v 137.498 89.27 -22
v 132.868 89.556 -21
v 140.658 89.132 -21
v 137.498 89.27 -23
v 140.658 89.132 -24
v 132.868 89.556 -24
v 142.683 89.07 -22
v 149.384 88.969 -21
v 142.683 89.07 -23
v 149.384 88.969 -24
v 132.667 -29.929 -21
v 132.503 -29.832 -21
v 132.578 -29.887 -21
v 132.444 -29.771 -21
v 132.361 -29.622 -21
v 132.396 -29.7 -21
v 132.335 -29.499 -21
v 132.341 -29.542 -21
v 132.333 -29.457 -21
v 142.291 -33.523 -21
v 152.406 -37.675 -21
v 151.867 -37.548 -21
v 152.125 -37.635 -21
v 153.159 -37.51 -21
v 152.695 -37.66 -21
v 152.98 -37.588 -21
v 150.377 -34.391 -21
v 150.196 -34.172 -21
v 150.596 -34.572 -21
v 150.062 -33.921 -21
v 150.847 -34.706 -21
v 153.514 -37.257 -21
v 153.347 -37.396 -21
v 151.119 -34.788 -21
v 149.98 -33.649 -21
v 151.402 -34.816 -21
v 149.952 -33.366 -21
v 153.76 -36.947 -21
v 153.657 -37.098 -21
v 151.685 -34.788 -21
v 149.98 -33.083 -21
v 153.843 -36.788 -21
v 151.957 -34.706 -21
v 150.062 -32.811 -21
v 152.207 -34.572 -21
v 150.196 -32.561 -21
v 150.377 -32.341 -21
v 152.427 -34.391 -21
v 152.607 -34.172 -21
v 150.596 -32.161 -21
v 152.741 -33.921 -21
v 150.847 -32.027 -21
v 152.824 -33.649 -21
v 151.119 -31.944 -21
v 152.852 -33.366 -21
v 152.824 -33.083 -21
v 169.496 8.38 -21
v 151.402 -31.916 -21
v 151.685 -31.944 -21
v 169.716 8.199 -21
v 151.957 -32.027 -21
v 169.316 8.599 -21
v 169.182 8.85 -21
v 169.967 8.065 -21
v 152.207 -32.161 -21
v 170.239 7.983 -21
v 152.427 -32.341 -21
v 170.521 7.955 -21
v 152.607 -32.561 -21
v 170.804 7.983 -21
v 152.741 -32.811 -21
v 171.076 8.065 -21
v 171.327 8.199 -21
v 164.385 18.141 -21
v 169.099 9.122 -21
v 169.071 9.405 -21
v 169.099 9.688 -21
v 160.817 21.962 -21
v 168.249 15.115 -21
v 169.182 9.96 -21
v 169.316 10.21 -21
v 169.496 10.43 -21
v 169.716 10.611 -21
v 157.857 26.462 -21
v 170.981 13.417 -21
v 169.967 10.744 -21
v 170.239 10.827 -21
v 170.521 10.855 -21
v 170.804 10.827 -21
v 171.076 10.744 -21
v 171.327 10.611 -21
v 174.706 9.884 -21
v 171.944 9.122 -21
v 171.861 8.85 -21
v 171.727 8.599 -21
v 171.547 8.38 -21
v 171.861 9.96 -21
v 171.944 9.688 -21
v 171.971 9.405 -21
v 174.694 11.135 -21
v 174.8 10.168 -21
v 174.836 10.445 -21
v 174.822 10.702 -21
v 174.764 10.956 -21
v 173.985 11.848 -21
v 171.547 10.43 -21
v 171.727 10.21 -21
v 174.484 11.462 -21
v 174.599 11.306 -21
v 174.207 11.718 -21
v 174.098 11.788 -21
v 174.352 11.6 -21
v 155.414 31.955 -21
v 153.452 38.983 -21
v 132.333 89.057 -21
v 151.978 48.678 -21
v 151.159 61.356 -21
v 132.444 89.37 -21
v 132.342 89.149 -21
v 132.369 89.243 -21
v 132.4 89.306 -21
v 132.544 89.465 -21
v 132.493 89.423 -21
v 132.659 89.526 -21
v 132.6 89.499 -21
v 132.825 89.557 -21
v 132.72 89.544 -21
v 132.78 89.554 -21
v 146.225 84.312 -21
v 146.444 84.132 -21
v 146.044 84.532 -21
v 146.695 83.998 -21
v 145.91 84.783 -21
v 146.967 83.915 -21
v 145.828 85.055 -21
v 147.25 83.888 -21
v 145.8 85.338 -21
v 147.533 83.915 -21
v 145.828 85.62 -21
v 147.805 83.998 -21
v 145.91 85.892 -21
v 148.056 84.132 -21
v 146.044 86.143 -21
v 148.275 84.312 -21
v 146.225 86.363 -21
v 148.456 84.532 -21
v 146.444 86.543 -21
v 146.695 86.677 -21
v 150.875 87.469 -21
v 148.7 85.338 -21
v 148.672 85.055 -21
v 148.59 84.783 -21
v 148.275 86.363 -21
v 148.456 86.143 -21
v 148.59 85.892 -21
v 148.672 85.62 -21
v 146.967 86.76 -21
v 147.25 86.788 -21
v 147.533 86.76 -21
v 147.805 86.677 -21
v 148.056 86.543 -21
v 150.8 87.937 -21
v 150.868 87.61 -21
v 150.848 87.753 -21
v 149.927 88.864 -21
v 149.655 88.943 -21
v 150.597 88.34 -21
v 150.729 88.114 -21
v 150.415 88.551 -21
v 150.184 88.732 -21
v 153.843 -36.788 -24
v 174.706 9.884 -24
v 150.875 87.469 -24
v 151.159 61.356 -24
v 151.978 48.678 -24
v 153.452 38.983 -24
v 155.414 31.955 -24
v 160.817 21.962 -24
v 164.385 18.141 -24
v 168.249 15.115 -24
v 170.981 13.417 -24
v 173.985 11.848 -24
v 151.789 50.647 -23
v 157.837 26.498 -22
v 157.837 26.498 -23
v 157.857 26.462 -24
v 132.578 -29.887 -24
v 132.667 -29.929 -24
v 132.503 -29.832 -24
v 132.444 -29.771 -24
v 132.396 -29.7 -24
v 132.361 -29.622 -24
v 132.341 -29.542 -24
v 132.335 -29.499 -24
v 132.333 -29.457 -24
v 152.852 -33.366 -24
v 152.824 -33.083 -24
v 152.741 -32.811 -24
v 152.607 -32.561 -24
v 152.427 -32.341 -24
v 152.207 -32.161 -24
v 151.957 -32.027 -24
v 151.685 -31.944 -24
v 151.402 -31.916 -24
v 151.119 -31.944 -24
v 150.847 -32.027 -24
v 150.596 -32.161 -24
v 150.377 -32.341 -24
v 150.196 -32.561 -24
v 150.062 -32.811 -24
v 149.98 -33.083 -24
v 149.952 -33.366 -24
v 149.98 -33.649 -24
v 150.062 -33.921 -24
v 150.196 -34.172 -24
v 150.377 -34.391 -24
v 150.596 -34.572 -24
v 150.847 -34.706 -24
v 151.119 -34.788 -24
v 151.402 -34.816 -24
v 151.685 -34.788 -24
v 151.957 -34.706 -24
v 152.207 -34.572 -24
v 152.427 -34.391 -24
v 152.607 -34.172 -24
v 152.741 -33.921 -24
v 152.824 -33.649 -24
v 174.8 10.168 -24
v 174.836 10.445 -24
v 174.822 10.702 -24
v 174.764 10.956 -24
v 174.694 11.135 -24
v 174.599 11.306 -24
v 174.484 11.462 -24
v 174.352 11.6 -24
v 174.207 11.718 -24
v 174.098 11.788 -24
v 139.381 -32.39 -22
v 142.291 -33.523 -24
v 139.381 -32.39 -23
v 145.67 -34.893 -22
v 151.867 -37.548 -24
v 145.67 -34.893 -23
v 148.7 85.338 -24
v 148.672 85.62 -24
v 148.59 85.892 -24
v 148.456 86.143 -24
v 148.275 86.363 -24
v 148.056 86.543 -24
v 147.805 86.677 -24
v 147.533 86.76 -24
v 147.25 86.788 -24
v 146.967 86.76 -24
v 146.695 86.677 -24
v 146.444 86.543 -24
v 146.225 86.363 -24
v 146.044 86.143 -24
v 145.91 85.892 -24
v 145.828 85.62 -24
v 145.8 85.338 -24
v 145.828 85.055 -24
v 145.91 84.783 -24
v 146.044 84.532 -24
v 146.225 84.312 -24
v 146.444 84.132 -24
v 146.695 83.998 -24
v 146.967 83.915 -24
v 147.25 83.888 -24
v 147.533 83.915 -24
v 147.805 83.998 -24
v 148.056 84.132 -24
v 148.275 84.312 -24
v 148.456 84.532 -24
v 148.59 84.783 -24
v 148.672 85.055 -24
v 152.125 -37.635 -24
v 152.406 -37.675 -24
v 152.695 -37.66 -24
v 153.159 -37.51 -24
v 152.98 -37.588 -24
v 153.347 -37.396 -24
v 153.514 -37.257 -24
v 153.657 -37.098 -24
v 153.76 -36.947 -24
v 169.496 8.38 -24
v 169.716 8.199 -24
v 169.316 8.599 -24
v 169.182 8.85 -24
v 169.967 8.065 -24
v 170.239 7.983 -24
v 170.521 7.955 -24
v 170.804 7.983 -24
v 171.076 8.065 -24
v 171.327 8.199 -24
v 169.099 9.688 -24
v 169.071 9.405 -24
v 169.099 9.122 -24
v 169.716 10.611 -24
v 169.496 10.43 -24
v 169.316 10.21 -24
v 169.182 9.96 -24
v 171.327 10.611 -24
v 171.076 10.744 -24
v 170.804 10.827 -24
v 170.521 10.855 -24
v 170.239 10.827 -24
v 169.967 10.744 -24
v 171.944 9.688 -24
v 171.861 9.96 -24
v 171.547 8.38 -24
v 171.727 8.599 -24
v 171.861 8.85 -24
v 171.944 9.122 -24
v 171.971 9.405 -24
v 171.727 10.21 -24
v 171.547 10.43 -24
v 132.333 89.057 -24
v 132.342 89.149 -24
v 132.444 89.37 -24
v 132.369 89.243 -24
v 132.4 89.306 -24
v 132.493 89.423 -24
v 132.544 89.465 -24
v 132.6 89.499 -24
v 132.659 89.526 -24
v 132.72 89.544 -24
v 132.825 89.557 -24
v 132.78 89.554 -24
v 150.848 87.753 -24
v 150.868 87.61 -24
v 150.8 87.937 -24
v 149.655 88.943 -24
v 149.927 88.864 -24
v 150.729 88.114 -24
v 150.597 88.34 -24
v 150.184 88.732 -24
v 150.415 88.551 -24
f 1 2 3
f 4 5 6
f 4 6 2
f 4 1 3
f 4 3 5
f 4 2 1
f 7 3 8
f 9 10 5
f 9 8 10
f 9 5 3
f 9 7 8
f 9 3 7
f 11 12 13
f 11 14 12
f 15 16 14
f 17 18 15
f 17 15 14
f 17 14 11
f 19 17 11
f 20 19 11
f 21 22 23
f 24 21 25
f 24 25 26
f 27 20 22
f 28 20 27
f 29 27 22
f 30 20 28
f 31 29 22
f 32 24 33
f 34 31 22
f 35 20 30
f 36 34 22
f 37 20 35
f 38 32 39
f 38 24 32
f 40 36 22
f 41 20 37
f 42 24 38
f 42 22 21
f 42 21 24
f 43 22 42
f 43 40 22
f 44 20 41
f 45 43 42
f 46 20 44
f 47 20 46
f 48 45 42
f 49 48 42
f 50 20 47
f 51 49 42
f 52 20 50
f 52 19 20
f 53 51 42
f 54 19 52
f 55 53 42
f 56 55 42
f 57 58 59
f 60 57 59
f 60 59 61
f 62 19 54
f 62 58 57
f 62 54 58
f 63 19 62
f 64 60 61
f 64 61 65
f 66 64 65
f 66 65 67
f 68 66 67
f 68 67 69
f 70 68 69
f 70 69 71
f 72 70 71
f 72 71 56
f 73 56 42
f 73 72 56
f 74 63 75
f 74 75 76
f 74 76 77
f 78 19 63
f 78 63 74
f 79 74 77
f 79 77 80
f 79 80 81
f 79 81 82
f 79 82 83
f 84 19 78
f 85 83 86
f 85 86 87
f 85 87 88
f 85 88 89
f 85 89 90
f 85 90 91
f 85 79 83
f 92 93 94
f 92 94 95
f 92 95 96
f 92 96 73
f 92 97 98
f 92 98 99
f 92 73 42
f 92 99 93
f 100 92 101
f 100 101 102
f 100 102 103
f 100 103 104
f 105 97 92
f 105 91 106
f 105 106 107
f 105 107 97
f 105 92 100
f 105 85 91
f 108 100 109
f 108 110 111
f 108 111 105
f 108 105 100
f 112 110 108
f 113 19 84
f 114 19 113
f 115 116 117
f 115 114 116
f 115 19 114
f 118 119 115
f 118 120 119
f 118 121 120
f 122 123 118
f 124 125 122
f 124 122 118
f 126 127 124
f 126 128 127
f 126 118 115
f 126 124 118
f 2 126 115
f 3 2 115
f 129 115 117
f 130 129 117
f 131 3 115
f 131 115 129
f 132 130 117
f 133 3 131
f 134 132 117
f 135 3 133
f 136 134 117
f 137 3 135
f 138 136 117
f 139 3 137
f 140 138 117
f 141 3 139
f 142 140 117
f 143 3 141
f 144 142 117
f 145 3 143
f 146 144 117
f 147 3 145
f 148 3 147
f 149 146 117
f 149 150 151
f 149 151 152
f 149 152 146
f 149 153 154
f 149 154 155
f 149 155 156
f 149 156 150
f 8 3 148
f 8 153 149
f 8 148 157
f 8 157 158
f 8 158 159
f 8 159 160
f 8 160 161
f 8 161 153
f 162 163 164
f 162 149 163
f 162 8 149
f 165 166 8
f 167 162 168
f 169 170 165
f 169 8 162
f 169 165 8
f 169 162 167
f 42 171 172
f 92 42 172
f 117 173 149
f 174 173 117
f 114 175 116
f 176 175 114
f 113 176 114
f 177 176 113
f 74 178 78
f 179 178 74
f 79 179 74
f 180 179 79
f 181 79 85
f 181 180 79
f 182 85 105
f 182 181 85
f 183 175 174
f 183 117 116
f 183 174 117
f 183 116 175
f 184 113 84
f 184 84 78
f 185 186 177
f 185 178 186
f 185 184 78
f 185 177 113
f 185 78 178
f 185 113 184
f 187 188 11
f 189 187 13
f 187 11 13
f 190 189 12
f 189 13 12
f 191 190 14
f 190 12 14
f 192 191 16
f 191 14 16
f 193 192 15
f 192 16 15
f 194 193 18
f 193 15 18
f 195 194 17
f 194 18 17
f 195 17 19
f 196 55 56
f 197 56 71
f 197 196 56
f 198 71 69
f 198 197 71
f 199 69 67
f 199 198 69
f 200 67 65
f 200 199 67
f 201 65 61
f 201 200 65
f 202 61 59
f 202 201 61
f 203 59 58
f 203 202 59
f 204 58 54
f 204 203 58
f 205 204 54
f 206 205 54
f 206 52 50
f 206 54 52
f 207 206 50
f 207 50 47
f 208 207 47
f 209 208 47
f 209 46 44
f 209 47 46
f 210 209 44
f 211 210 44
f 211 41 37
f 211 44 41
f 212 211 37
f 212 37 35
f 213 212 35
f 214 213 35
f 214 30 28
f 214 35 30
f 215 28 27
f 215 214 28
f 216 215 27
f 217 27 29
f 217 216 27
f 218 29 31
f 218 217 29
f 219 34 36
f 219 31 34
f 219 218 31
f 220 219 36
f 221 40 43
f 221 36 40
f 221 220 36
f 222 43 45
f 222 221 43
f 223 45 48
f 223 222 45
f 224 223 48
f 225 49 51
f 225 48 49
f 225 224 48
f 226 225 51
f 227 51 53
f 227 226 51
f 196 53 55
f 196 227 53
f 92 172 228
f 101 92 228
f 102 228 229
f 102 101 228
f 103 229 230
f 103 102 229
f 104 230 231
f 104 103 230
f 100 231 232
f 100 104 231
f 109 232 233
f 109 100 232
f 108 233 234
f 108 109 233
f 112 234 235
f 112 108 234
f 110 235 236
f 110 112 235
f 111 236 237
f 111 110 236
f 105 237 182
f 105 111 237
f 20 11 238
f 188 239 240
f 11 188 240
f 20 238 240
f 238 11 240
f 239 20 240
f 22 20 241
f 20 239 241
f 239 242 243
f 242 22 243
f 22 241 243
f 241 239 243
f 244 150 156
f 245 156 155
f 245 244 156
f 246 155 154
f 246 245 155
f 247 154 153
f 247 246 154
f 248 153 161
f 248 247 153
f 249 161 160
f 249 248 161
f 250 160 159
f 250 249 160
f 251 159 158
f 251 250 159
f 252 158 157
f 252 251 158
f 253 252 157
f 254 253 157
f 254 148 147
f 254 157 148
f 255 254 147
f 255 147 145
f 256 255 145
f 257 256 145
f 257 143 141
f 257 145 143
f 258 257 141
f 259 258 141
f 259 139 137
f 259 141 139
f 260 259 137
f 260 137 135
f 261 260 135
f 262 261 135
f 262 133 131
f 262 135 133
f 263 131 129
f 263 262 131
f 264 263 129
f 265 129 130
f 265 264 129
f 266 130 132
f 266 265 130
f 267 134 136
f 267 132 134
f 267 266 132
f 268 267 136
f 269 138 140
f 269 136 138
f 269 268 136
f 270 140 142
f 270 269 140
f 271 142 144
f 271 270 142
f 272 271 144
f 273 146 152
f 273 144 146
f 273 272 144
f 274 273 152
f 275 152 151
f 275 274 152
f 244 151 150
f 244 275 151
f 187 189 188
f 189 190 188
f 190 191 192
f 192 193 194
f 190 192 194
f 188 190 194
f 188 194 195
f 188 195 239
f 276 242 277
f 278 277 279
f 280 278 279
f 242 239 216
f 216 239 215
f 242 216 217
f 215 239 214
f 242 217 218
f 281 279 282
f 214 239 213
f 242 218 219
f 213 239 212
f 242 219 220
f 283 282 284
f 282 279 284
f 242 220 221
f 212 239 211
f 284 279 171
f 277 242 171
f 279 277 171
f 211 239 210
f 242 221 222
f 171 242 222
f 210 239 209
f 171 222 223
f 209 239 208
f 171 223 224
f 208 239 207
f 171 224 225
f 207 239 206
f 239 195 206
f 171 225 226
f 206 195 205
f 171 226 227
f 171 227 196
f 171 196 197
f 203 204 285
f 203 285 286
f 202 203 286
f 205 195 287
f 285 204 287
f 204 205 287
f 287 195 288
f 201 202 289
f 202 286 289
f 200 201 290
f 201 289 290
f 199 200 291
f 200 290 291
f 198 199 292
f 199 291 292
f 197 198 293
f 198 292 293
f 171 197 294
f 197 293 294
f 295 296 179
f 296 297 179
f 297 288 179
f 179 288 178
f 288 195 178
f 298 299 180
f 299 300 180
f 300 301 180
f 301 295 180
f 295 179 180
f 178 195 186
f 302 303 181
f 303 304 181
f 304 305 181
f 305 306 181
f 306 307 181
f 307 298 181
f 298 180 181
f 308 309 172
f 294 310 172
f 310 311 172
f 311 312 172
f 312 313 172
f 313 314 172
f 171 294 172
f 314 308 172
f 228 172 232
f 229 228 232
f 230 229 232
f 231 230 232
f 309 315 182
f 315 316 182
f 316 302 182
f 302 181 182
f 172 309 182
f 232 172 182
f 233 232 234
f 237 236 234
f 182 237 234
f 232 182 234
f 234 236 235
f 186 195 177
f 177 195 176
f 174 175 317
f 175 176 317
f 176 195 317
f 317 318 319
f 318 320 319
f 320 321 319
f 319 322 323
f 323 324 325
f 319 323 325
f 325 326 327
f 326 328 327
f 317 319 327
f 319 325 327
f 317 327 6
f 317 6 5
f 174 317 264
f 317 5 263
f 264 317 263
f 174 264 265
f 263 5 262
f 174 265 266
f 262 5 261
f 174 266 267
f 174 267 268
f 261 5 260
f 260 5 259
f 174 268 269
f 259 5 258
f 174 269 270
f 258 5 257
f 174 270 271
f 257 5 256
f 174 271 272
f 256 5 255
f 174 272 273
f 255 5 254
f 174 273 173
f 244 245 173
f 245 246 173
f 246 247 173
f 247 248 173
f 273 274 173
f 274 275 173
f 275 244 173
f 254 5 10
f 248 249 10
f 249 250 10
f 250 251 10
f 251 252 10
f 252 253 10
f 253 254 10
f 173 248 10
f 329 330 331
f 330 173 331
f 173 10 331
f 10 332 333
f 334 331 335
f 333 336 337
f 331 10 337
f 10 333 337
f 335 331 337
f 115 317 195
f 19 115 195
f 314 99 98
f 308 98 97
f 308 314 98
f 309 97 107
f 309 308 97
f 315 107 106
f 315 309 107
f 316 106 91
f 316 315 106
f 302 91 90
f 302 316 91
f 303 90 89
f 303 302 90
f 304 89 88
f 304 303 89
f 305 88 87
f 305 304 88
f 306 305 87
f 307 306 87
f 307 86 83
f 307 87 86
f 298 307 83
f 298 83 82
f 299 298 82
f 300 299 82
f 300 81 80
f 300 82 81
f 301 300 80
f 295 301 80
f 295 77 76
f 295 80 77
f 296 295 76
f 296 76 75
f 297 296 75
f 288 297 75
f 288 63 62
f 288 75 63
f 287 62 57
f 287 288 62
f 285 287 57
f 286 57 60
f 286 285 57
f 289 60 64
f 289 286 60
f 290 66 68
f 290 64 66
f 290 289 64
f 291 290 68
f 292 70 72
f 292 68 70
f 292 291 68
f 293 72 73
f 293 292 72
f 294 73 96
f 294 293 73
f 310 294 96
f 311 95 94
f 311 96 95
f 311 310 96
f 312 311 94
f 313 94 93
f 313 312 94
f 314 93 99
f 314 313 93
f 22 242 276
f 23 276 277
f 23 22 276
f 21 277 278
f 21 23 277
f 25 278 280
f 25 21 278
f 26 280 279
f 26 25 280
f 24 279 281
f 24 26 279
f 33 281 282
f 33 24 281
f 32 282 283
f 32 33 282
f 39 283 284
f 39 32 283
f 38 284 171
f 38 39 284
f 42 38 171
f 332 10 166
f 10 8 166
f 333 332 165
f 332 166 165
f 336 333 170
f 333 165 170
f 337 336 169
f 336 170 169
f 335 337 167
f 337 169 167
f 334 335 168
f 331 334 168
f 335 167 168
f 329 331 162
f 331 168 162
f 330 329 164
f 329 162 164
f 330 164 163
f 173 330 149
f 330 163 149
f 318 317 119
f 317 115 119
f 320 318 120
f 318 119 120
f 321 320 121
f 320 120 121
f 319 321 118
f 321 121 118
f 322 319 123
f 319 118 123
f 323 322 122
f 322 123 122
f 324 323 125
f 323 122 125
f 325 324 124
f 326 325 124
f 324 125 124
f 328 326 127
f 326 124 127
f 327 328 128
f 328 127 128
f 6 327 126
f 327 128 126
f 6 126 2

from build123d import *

# Parameters (mm, degrees)
PAD012_DEPTH    = 3
SKETCH047_R     = 1.45
POCKET013_DEPTH = 27
FILLET010_R     = 1.5
FILLET018_R     = 0.5


with BuildPart() as part:
    # Sketch036 → Pad012 (new body)
    with BuildSketch(Plane.XY):
        with BuildLine():
            add(Edge.make_bspline(
                [(132.333333, -29.811537), (140.031799, -32.510384), (146.350027, -35.078621), (153.231854, -38.154949)],
                knots=[0, 0, 0, 0, 1, 1, 1, 1], degree=3))
            Line((153.231854, -38.154949), (175.310198, 11.234895))
            add(Edge.make_bspline(
                [(150.875, 88.9625), (150.875, 42.8625), (150.875, 22.157965), (175.310198, 11.234895)],
                knots=[0, 0, 0, 0, 1, 1, 1, 1], degree=3))
            add(Edge.make_bspline(
                [(132.333333, 89.593483), (137.531693, 89.226463), (141.793335, 88.990242), (150.875, 88.9625)],
                knots=[0, 0, 0, 0, 1, 1, 1, 1], degree=3))
            Line((132.333333, 89.593483), (132.333333, -29.811537))
        make_face()
    extrude(amount=PAD012_DEPTH)

    # Sketch047 → Pocket013 (cut)
    with BuildSketch(Plane.XY):
        with Locations((-4.375, -4.375)):
            Circle(SKETCH047_R)
        with Locations((-4.375, 80.575)):
            Circle(SKETCH047_R)
        with Locations((151.401832, -33.366184)):
            Circle(SKETCH047_R)
        with Locations((170.521433, 9.404873)):
            Circle(SKETCH047_R)
        with Locations((147.25, 85.3375)):
            Circle(SKETCH047_R)
        with Locations((43.25, -13.9)):
            Circle(SKETCH047_R)
        with Locations((57.15, 92.085)):
            Circle(SKETCH047_R)
        with Locations((95.25, 92.085)):
            Circle(SKETCH047_R)
        with Locations((95.25, -13.9)):
            Circle(SKETCH047_R)
    extrude(amount=POCKET013_DEPTH, mode=Mode.SUBTRACT)

    # Fillet010
    fillet010_edges = [part.edges().sort_by_distance(p)[0] for p in [
        (175.310198, 11.234895, 1.5),
        (150.875, 88.9625, 1.5),
        (153.231854, -38.154949, 1.5),
    ]]
    fillet(fillet010_edges, radius=FILLET010_R)

    # Fillet018
    fillet018_edges = [part.edges().sort_by_distance(p)[0] for p in [
        (132.333333, 89.593483, 1.5),
        (132.333333, -29.811537, 1.5),
    ]]
    fillet(fillet018_edges, radius=FILLET018_R)


with BuildPart() as part_1:
    # Body011 placement: moved
    add(part.part.moved(Location((0, 0, -24))))


solid = part_1.part
